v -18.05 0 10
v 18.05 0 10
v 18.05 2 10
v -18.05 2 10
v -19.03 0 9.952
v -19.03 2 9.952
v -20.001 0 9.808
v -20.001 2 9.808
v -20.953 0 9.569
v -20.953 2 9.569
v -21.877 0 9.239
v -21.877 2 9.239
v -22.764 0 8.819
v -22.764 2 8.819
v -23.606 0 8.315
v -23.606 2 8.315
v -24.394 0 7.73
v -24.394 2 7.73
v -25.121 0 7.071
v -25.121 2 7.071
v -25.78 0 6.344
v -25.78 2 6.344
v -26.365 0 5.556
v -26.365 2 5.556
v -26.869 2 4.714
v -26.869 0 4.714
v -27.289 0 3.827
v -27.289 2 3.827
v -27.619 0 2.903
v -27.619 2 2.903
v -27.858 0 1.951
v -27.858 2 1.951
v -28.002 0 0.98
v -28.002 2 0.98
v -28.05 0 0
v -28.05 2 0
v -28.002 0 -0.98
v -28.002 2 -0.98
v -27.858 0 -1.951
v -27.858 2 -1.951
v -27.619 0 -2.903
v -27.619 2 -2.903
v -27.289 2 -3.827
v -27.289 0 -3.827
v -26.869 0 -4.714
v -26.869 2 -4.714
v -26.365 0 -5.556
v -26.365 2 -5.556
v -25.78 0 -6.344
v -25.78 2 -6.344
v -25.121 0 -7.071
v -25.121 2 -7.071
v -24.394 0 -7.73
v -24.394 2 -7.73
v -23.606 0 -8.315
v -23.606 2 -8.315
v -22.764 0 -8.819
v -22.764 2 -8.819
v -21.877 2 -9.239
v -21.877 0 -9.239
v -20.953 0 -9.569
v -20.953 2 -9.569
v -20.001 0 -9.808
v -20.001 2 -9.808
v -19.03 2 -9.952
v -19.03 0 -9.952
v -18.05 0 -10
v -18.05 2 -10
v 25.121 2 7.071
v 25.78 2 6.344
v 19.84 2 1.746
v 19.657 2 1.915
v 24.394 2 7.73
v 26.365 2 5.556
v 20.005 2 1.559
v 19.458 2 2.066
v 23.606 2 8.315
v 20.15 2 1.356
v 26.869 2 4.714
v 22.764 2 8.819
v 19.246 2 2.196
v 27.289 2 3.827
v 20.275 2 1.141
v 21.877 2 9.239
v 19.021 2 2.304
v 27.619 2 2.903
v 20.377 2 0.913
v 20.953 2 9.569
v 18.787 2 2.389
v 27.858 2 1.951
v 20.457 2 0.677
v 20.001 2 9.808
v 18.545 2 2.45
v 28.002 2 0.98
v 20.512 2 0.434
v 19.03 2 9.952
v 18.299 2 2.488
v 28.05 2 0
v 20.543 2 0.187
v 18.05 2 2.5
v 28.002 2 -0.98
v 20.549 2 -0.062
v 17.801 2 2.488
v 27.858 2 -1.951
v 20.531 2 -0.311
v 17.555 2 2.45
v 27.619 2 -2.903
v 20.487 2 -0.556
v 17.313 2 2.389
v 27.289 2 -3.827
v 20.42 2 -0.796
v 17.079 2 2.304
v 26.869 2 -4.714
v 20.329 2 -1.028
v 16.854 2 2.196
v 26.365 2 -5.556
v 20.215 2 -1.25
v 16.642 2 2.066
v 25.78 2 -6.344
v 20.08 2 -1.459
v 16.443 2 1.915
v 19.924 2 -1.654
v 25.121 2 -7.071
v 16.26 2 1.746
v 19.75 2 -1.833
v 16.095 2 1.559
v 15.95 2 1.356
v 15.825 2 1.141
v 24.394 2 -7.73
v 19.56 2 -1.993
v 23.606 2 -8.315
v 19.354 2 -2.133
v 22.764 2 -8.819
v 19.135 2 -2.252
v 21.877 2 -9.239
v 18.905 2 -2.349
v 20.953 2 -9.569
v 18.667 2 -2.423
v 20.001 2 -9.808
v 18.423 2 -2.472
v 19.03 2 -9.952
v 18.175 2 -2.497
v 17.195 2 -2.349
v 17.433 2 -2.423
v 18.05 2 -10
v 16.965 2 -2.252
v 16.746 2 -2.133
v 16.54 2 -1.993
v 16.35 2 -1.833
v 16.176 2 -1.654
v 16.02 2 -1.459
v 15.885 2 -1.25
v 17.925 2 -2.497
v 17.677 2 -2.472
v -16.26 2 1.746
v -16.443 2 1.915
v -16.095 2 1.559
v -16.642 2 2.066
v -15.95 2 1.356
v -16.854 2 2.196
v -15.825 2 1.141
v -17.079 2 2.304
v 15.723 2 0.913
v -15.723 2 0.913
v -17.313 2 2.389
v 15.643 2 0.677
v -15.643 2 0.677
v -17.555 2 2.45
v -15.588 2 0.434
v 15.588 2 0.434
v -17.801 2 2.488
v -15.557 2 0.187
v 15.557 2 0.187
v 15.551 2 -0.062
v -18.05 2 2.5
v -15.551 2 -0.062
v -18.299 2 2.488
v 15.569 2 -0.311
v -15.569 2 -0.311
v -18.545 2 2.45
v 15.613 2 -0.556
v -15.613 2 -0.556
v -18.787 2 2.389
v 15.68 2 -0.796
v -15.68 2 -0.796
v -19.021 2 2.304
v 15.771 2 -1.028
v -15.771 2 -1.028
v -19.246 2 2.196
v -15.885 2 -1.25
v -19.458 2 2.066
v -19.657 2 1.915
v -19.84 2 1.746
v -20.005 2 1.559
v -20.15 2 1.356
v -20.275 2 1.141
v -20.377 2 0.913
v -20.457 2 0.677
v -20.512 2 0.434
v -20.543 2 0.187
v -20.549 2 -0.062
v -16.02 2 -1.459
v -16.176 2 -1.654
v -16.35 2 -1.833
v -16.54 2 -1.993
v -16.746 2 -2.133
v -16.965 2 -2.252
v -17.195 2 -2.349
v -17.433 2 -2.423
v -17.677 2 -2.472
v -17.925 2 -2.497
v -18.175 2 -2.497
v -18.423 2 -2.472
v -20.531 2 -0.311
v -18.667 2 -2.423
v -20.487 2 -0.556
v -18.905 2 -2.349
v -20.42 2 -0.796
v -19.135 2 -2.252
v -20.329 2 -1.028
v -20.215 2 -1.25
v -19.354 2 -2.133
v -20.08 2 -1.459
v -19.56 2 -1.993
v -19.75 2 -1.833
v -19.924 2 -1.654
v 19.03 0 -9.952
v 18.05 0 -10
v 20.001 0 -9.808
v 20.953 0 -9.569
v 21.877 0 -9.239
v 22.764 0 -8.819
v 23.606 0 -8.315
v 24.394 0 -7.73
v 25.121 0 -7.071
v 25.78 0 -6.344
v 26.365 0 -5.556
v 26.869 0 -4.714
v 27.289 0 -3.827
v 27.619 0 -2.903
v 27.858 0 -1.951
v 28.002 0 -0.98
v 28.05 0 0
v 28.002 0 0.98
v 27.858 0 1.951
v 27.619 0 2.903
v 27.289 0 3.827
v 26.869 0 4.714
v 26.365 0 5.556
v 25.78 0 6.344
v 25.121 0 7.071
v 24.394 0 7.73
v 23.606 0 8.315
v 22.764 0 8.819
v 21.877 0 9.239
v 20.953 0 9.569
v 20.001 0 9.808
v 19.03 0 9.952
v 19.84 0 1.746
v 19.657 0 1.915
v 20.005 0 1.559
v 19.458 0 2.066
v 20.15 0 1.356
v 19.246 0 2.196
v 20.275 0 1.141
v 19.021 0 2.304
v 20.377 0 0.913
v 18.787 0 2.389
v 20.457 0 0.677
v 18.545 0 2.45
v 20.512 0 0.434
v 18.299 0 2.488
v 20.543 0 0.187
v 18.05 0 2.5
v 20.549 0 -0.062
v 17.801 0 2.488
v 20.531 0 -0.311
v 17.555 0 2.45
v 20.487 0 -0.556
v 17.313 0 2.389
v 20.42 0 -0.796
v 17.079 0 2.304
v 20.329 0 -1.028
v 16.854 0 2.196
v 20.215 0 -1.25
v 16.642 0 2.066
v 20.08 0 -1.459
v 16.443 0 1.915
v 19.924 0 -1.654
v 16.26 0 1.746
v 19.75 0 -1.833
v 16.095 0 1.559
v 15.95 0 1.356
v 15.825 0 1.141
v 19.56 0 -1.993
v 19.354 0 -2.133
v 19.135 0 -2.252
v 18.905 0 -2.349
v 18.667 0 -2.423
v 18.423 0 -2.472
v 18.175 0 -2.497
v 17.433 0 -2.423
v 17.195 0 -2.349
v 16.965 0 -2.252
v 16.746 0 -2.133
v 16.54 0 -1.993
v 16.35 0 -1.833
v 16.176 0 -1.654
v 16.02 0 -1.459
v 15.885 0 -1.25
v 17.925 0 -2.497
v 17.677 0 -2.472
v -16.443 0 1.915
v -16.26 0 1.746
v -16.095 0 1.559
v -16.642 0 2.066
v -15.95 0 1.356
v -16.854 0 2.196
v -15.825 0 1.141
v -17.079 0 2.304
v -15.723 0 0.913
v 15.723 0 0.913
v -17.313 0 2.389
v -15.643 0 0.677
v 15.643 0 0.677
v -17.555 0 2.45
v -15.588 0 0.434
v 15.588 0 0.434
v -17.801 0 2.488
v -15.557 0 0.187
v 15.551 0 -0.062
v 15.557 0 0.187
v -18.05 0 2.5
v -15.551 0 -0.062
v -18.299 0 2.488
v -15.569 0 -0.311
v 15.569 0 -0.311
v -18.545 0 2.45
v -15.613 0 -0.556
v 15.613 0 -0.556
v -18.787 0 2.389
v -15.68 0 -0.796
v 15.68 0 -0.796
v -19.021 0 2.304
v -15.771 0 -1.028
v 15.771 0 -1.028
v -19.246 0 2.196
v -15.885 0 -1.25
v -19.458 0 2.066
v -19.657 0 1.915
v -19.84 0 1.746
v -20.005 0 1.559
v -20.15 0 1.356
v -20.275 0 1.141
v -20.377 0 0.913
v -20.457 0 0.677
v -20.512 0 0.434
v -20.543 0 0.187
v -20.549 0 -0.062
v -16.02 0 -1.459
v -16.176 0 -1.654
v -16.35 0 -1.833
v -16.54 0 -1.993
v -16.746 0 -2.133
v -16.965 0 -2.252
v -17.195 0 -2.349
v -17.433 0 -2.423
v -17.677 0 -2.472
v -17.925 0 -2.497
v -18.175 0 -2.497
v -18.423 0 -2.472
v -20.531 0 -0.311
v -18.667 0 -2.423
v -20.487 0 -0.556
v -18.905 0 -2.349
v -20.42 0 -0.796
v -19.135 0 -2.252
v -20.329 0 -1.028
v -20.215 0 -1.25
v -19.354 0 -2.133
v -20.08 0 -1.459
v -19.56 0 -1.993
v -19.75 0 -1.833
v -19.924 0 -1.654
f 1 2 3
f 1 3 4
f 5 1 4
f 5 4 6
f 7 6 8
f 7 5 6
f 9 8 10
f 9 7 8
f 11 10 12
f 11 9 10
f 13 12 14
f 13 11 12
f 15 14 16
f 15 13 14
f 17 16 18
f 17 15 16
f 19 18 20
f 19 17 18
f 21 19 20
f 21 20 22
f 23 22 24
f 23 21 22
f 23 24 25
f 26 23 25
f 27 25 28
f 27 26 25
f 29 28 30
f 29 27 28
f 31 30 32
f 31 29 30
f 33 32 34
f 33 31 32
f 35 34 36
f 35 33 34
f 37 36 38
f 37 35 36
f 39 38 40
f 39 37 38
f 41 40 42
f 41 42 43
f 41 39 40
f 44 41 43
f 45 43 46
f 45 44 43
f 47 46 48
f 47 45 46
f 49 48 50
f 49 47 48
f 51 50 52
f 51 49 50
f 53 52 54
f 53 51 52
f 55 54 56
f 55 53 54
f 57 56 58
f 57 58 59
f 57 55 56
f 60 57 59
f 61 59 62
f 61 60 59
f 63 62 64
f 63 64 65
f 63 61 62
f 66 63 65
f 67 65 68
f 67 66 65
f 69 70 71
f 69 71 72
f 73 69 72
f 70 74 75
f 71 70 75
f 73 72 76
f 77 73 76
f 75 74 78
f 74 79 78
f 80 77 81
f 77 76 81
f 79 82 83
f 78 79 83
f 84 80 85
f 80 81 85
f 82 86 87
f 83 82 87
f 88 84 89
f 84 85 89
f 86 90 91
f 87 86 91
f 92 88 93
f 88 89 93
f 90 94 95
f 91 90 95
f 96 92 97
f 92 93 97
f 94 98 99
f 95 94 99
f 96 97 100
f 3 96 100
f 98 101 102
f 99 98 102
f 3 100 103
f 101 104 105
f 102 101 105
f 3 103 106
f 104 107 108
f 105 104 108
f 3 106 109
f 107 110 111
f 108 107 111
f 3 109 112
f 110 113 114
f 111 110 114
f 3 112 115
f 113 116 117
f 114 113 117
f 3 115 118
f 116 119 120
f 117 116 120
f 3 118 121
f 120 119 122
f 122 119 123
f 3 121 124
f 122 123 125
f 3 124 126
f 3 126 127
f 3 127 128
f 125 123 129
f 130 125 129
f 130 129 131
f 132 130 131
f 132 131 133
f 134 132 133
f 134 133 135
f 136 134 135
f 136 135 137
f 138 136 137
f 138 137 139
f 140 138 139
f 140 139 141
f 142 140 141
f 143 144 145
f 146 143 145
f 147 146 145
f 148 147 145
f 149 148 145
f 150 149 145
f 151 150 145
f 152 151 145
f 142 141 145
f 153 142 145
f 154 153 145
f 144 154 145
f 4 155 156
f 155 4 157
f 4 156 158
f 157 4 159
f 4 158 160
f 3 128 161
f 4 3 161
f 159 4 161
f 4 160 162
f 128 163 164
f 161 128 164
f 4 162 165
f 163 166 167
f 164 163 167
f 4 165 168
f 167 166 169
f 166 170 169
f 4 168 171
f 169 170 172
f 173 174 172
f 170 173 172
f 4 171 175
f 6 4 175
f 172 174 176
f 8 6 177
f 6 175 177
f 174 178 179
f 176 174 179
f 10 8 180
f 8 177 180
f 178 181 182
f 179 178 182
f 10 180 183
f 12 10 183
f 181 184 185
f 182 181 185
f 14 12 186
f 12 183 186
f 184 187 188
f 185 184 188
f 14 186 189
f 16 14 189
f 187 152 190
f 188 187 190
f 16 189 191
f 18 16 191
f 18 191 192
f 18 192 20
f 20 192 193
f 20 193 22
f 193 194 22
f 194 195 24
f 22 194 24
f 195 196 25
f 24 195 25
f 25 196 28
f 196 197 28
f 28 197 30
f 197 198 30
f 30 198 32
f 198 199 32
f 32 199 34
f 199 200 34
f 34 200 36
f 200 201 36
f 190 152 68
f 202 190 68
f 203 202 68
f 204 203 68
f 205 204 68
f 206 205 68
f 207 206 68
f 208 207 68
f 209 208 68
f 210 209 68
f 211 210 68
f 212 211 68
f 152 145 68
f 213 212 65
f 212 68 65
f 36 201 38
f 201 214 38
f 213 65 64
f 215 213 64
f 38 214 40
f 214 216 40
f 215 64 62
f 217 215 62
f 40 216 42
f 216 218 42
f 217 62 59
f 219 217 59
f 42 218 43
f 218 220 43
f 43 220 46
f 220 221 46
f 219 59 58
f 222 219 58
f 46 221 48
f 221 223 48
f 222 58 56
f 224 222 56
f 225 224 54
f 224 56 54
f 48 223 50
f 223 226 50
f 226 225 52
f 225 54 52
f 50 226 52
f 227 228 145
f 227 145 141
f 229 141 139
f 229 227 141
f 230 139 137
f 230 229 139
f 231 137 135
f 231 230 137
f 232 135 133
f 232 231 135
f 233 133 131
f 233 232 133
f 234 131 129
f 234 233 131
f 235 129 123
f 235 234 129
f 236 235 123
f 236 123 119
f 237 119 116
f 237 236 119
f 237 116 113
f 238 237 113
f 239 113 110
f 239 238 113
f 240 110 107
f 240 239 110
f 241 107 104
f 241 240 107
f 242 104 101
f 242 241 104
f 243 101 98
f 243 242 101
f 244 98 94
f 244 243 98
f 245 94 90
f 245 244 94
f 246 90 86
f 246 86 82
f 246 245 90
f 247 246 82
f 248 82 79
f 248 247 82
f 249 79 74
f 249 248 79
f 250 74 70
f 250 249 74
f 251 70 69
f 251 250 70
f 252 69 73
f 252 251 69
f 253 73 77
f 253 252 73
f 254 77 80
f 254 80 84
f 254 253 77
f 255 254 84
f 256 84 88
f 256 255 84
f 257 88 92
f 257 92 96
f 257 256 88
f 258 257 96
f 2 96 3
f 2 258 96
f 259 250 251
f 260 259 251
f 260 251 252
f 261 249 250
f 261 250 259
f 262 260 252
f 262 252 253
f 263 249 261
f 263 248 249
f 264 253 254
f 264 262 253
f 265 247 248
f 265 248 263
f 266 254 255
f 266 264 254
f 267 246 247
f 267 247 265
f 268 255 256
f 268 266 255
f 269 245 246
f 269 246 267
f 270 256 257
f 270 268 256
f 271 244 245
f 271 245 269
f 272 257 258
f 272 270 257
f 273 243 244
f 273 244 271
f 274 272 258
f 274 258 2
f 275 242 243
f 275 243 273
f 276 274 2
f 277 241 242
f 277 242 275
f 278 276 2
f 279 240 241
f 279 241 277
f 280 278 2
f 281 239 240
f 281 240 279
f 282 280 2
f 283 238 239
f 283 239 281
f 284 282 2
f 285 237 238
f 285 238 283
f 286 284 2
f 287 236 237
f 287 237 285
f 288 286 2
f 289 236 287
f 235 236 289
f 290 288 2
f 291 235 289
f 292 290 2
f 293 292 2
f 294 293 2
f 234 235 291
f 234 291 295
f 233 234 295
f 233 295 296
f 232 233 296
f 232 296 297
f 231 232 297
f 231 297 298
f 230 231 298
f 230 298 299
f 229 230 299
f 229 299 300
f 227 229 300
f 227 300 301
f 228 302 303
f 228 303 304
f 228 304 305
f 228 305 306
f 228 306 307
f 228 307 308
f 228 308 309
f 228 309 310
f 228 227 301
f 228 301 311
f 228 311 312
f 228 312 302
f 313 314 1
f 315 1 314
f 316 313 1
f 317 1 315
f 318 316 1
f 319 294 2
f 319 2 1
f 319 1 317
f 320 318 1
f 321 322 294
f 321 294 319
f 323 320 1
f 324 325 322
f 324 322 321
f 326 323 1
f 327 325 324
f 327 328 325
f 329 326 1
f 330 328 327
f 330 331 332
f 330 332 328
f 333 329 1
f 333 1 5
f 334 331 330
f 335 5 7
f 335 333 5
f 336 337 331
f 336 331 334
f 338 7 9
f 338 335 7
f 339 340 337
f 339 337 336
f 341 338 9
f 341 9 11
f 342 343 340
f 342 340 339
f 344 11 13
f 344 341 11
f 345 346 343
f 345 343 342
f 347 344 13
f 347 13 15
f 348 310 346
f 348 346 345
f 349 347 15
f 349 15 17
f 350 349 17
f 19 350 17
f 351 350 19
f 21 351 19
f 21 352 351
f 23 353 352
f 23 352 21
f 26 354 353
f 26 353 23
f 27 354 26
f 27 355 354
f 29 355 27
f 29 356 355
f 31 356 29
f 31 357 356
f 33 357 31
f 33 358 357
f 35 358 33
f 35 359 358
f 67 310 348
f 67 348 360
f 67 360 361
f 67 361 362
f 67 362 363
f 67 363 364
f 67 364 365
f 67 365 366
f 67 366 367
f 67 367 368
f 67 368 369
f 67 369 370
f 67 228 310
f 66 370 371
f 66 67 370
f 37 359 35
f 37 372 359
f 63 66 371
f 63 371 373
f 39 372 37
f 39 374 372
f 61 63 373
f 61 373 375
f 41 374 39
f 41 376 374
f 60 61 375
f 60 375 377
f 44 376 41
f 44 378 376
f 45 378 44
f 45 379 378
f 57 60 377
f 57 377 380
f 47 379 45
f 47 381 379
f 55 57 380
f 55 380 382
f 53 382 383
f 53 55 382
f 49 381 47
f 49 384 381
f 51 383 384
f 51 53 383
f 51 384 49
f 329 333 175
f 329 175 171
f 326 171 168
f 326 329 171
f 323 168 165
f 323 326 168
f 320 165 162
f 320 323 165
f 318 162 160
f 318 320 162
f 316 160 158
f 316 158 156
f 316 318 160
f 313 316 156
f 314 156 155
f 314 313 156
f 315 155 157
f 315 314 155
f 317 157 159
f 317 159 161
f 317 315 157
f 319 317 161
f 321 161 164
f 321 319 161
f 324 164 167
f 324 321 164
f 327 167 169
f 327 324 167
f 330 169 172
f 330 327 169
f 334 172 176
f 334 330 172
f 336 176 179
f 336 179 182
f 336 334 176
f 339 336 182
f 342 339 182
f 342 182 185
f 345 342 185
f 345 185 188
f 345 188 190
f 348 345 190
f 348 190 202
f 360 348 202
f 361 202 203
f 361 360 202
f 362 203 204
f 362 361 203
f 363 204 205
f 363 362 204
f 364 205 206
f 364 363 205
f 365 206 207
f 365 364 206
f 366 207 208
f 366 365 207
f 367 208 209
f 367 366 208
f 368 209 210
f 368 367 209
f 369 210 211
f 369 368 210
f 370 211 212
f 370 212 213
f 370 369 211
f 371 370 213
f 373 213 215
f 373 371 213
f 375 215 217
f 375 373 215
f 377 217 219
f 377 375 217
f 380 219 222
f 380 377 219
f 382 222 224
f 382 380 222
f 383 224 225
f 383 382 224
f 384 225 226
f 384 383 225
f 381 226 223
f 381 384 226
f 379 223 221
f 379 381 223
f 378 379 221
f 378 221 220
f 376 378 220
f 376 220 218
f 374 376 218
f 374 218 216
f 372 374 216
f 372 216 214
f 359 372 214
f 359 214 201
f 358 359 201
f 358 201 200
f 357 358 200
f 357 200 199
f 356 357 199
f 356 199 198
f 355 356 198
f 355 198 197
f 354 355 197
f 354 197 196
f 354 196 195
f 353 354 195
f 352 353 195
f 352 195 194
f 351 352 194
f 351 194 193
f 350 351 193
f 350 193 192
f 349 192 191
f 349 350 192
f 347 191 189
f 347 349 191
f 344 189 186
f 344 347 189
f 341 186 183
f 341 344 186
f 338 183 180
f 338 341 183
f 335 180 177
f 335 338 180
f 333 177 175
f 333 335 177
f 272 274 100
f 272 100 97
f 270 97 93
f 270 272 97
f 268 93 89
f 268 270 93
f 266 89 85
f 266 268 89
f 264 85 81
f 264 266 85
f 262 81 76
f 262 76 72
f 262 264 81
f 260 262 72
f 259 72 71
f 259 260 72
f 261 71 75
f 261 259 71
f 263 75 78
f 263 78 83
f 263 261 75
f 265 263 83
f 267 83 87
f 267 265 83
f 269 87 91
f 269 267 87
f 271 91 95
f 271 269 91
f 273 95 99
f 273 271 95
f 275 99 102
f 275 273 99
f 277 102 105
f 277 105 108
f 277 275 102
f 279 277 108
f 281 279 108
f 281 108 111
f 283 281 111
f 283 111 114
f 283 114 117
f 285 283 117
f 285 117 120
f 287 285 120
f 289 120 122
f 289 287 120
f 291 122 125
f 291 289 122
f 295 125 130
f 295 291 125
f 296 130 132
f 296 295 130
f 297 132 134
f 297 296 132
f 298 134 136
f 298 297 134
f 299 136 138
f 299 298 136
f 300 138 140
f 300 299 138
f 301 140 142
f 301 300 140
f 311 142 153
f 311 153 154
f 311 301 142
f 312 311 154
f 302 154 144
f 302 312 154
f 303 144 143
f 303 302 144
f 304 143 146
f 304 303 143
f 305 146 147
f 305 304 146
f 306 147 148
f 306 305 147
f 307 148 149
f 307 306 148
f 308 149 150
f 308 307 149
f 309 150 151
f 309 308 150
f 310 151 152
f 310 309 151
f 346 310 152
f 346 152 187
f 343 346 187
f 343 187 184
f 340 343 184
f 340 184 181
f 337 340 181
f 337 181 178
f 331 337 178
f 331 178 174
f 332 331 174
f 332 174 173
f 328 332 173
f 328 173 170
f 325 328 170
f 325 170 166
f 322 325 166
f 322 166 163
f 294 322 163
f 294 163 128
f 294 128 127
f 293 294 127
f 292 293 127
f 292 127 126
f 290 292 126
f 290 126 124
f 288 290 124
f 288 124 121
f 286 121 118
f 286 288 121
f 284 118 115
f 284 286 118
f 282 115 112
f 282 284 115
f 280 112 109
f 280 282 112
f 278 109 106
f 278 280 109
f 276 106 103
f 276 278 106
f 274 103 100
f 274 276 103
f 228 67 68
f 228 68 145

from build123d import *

# Parameters (mm, degrees)
IZIM1_R                     = 2.5
Y_KSEKLIK_EKSTR_ZYON1_DEPTH = 2


with BuildPart() as part:
    # Çizim1 → Yükseklik-Ekstrüzyon1 (new body)
    with BuildSketch(Plane(origin=(0, 0, 0), x_dir=(1, 0, 0), z_dir=(0, 1, 0))):
        with BuildLine():
            Line((-18.05, 10), (18.05, 10))
            ThreePointArc((18.05, 10), (28.05, 0), (18.05, -10))
            Line((18.05, -10), (-18.05, -10))
            ThreePointArc((-18.05, -10), (-28.05, 0), (-18.05, 10))
        make_face()
        with Locations(Location((-18.05, 0, 0), (0, 0, 270))):
            Circle(IZIM1_R, mode=Mode.SUBTRACT)
        with Locations(Location((18.05, 0, 0), (0, 0, 270))):
            Circle(IZIM1_R, mode=Mode.SUBTRACT)
    extrude(amount=Y_KSEKLIK_EKSTR_ZYON1_DEPTH)


solid = part.part
